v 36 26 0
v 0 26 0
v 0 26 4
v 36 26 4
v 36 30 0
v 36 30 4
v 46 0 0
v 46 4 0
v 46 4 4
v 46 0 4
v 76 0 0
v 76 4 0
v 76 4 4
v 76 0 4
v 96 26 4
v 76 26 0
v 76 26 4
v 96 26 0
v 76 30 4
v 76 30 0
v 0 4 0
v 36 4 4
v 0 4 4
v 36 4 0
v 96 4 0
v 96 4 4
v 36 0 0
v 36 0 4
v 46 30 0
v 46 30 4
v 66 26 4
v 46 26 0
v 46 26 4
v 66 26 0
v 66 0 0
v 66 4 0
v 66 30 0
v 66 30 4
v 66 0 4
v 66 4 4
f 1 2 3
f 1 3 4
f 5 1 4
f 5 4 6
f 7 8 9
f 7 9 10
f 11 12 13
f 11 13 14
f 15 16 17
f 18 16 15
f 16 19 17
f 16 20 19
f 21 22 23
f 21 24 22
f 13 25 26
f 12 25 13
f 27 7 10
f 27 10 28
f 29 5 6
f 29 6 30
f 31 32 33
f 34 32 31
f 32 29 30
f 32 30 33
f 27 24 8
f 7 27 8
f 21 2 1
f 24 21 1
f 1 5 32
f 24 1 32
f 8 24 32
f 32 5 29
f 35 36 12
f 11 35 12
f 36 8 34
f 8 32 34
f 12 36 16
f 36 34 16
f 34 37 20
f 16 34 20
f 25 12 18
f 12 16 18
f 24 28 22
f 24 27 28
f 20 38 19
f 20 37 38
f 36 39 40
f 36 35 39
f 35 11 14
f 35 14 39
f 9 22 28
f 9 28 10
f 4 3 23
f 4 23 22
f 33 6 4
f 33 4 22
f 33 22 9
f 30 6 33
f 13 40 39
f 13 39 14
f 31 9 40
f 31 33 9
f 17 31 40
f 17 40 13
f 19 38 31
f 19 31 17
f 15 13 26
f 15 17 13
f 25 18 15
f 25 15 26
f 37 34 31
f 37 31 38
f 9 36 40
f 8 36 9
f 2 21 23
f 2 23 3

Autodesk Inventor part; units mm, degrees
ref_plane "YZ Plane" through (0, 0, 0) normal (1, 0, 0) x (0, 1, 0)
ref_plane "XZ Plane" through (0, 0, 0) normal (0, 1, 0) x (-1, 0, 0)
ref_plane "XY Plane" through (0, 0, 0) normal (0, 0, 1) x (1, 0, 0)
sketch "Sketch1" plane through (0, 0, 0) normal (0, 0, 1) x (1, 0, 0)
  line L0 (0, 4) -> (0, 26)
  line L1 (0, 26) -> (36, 26)
  line L2 (36, 26) -> (36, 30)
  line L3 (36, 30) -> (46, 30)
  line L4 (46, 30) -> (46, 26)
  line L5 (46, 26) -> (66, 26)
  line L6 (66, 26) -> (66, 30)
  line L7 (66, 30) -> (76, 30)
  line L8 (76, 30) -> (76, 26)
  line L9 (76, 26) -> (96, 26)
  line L10 (96, 26) -> (96, 4)
  line L11 (96, 4) -> (76, 4)
  line L12 (76, 4) -> (76, 0)
  line L13 (76, 0) -> (66, 0)
  line L14 (66, 0) -> (66, 4)
  line L15 (66, 4) -> (46, 4)
  line L16 (46, 4) -> (46, 0)
  line L17 (46, 0) -> (36, 0)
  line L18 (36, 4) -> (0, 4)
  line L19 (36, 0) -> (36, 4)
  point P0 (0, 0)
  dimension "d0" = 22
  dimension "d1" = 36
  dimension "d2" = 4
  dimension "d3" = 10
  dimension "d4" = 20
  dimension "d5" = 10
  dimension "d6" = 20
extrude "Extrusion1" add sketch "Sketch1" along normal blind 4
properties part number "hlid"
